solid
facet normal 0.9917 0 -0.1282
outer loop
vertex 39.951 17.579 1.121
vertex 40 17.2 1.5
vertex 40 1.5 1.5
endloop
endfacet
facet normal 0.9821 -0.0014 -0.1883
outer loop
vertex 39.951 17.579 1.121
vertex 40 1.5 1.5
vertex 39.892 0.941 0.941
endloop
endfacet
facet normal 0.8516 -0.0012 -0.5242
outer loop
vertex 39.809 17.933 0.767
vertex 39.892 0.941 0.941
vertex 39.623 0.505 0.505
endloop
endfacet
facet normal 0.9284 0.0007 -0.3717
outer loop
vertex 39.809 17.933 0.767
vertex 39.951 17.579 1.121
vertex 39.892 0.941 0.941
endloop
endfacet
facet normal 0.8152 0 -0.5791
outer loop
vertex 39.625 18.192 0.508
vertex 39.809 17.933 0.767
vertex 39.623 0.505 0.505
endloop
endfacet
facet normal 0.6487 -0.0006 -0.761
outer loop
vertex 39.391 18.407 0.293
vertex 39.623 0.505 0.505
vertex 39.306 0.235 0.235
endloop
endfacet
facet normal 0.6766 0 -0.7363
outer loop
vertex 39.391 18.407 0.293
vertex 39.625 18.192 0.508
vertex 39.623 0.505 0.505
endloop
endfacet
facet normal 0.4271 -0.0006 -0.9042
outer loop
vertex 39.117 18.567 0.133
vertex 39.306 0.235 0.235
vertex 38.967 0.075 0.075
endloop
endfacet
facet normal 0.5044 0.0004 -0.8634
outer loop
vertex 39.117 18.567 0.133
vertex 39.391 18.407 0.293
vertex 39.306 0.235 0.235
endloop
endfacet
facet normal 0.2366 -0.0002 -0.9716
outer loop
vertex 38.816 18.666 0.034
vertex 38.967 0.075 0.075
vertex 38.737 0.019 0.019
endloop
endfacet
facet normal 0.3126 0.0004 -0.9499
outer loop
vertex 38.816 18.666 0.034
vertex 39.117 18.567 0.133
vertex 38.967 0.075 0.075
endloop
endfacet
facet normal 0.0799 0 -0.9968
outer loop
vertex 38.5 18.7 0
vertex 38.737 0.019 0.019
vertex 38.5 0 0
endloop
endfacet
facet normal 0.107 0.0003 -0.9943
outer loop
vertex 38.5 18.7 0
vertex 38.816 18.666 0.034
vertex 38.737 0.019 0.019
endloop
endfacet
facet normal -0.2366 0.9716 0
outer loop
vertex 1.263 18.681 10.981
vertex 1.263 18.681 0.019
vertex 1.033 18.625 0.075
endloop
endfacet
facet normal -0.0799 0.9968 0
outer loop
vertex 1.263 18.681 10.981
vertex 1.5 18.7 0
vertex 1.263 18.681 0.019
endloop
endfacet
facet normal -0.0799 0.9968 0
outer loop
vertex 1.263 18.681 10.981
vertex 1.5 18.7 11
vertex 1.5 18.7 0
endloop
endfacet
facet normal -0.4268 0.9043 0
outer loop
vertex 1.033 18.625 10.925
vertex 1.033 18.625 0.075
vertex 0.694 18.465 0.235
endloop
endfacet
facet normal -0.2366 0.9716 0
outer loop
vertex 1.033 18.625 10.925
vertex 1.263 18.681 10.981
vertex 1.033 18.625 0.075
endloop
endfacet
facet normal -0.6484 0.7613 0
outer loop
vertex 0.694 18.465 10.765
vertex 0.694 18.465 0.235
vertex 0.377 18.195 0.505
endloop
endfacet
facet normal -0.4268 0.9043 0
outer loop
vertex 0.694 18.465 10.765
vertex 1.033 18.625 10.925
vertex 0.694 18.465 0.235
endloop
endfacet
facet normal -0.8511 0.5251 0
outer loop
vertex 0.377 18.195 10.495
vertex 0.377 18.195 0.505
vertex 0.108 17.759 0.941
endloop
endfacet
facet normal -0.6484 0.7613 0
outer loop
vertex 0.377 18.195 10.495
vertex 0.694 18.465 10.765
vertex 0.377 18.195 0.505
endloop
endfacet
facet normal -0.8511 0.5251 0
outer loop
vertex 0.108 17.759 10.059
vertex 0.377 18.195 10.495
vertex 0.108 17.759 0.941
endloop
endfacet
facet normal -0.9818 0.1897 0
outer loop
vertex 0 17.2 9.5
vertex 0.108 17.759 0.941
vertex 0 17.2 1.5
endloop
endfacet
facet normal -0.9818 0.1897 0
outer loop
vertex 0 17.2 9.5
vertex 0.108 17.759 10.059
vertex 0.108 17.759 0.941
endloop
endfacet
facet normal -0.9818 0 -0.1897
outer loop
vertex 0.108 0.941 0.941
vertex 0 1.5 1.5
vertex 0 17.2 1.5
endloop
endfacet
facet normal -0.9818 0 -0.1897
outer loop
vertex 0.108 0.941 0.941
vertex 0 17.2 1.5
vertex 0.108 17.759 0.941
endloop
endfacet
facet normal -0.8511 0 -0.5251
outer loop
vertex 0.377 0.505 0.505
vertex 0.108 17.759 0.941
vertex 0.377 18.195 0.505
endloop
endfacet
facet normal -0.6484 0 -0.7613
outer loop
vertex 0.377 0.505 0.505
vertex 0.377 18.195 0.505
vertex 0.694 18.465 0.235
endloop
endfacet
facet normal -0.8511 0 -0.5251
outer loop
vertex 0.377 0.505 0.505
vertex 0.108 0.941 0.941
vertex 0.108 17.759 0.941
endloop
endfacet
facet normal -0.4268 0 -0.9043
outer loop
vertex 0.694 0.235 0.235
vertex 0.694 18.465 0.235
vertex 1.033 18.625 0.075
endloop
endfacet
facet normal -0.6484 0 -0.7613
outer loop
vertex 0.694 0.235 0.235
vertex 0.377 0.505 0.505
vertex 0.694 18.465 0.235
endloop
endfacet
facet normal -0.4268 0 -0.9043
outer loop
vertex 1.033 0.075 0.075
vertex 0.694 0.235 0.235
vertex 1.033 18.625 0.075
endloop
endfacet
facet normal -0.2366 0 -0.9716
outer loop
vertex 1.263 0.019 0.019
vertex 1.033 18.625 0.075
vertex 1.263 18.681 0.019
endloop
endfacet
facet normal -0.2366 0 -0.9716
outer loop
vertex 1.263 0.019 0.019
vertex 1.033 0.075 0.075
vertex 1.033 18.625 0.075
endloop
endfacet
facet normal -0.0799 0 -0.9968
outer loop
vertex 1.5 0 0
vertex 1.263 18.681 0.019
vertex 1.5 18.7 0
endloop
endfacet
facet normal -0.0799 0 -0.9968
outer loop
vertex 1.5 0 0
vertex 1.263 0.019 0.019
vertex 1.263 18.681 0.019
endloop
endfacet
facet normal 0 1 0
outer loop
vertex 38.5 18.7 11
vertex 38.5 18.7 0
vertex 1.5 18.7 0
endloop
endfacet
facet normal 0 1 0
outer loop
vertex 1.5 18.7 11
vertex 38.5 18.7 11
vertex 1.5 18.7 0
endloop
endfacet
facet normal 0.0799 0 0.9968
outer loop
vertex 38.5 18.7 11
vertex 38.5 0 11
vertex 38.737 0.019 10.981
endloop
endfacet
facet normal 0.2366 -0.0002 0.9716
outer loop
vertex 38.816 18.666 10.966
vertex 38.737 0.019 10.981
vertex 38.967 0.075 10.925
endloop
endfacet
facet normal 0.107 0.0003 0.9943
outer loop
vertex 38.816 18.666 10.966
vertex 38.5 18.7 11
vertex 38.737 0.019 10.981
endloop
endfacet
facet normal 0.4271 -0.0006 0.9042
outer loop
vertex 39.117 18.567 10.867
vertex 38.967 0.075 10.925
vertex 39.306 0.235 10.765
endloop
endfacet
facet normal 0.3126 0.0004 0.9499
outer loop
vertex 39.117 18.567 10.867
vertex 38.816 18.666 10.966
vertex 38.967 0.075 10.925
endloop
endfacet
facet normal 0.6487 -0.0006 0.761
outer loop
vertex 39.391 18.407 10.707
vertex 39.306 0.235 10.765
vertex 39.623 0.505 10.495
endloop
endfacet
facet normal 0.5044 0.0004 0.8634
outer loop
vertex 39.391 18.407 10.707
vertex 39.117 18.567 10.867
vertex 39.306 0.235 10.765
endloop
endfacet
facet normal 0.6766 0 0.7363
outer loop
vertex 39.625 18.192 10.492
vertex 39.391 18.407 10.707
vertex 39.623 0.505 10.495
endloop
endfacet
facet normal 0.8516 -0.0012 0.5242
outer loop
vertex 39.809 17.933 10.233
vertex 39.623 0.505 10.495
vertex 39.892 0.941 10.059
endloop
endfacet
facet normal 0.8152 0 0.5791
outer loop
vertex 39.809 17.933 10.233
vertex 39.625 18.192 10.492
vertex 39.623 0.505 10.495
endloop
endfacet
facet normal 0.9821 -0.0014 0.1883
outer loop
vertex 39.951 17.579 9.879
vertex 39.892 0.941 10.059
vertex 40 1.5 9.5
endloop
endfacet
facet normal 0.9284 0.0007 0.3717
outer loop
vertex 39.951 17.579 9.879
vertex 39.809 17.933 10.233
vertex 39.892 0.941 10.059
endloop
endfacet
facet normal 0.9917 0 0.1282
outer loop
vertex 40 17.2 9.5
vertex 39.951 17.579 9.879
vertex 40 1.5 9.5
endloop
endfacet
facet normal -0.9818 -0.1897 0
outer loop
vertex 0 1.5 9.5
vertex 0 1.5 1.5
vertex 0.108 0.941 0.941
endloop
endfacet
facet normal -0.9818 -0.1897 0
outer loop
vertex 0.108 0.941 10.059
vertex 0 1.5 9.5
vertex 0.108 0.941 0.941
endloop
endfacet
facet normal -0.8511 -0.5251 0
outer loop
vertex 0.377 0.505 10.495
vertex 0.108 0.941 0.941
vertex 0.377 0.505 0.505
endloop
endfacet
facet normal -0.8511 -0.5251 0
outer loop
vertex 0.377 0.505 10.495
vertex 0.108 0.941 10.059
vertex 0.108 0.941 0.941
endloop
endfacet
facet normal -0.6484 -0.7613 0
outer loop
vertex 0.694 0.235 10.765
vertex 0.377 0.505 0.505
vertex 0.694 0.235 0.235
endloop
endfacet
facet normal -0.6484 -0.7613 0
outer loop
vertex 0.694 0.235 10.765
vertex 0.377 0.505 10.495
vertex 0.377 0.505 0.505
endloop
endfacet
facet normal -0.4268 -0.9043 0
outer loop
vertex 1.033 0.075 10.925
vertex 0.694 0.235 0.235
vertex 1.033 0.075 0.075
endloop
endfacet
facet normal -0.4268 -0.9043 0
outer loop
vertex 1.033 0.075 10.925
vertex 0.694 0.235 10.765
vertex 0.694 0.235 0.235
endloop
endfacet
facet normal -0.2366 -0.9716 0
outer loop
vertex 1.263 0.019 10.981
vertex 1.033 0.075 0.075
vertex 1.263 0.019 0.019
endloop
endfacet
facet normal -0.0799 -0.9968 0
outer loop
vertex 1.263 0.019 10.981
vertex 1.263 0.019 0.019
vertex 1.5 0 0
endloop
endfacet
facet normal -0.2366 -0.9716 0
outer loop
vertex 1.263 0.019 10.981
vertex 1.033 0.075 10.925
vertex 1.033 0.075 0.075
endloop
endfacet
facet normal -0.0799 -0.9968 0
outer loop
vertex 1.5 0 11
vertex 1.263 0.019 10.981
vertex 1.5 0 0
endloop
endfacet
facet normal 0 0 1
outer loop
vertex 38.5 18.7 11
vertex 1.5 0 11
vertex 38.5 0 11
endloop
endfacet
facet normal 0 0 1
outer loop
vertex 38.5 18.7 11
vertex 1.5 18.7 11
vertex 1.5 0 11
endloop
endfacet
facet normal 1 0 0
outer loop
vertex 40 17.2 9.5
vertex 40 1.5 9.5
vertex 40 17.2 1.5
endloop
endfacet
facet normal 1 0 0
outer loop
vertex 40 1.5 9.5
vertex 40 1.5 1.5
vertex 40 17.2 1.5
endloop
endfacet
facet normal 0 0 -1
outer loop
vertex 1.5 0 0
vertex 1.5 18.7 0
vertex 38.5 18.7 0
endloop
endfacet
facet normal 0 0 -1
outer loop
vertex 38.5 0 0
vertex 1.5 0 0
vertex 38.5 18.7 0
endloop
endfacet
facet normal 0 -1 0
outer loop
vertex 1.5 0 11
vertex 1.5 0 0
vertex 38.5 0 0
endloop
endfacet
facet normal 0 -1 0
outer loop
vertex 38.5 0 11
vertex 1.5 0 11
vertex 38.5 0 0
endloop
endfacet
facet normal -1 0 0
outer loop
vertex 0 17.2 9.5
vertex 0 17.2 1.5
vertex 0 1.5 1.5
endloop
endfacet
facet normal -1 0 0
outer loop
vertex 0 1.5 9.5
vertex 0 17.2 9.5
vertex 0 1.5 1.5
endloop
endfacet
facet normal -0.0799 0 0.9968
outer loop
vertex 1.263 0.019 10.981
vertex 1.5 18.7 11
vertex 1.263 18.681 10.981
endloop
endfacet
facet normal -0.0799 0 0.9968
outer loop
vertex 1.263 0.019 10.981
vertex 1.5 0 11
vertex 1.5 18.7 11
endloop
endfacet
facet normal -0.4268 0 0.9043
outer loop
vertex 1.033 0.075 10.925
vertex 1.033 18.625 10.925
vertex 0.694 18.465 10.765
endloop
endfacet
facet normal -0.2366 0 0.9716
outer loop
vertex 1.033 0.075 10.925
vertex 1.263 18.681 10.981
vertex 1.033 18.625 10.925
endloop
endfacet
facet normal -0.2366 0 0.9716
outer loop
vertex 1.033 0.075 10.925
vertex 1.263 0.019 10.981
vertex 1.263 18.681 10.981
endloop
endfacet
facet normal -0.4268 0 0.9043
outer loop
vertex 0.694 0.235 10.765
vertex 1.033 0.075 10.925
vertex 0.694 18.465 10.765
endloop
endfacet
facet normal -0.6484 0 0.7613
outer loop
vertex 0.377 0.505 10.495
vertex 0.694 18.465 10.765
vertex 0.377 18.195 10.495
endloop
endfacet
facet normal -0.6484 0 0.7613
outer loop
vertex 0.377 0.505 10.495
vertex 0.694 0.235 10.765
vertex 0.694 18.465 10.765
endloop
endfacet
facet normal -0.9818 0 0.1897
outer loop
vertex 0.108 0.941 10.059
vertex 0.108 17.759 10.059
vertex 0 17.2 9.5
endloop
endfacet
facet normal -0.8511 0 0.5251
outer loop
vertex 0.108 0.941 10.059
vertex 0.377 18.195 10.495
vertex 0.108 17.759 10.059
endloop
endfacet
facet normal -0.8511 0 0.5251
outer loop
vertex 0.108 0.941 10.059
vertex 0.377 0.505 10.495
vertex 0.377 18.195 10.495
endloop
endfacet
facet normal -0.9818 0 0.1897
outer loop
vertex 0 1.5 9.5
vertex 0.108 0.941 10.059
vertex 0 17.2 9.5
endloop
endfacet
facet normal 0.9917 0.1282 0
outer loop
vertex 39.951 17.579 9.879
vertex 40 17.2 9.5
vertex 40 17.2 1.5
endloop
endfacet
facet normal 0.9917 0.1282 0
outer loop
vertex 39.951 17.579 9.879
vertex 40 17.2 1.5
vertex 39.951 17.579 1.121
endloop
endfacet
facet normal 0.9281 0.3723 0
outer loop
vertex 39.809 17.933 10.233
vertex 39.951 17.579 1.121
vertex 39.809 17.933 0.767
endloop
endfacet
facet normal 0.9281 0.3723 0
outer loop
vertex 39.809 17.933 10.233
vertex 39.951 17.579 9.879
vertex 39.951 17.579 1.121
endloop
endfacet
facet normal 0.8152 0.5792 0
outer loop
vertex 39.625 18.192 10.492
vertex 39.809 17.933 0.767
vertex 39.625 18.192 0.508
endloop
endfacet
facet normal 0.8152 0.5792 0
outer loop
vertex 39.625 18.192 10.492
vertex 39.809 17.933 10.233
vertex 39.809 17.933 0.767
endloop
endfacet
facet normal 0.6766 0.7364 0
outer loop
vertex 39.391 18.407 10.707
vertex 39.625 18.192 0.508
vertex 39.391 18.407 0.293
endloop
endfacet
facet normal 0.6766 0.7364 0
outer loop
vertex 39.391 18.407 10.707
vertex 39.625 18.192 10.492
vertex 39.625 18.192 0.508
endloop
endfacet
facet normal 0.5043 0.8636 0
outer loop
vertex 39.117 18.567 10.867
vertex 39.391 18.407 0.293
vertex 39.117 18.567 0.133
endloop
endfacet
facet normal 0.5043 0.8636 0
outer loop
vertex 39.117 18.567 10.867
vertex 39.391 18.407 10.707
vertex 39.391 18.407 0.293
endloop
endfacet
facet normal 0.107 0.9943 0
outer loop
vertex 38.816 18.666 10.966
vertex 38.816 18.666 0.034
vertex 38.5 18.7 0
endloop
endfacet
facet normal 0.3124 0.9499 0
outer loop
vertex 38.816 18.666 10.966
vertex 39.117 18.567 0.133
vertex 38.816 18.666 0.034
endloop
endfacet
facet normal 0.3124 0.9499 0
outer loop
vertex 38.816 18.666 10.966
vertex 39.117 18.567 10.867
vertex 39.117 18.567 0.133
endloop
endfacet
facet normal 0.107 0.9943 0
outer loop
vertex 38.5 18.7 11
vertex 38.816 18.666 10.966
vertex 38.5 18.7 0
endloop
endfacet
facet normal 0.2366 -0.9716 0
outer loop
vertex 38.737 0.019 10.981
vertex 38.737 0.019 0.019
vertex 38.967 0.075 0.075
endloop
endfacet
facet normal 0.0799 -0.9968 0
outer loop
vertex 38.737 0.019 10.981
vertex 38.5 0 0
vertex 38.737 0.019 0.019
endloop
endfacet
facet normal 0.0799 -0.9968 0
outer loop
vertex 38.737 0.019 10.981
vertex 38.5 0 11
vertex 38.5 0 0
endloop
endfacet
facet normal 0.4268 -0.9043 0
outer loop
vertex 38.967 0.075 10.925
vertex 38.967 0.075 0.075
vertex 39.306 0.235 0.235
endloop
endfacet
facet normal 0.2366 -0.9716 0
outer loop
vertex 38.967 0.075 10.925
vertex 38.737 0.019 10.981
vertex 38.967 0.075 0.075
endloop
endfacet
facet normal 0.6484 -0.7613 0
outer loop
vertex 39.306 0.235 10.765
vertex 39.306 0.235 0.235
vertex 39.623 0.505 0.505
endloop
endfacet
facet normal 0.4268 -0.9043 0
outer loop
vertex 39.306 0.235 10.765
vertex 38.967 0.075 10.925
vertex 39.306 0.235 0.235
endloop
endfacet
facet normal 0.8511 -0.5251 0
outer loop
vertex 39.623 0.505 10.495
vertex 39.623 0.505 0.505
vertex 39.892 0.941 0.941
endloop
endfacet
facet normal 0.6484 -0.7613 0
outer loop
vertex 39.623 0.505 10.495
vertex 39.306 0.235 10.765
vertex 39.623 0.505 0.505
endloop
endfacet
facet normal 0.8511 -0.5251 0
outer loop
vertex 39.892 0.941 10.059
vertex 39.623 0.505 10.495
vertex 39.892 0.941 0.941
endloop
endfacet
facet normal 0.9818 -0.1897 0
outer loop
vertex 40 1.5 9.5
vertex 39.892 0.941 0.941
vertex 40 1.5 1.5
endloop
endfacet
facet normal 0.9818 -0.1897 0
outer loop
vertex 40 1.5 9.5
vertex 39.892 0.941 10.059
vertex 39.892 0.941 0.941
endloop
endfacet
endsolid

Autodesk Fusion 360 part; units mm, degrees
sketch "Sketch1" plane through (0, 0, 0) normal (0, 0, 1) x (1, 0, 0)
  line L0 (0, 0) -> (40, 0)
  line L1 (40, 0) -> (40, 18.7)
  line L2 (40, 18.7) -> (0, 18.7)
  line L3 (0, 18.7) -> (0, 0)
  dimension "d1" = 18.7
extrude "Extrude1" add sketch "Sketch1" along normal blind 11
fillet "Fillet1" radius 1.5 2 faces at (40, 6.2333, 7.3333) (0, 12.4667, 7.3333)
